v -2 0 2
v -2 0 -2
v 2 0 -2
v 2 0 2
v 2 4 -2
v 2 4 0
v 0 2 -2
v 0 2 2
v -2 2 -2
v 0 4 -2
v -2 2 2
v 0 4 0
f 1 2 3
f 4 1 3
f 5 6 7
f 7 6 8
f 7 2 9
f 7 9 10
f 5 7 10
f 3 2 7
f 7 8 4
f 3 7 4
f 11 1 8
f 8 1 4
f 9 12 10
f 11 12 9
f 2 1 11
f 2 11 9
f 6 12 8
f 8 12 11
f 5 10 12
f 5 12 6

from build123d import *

# Parameters (mm, degrees)
SKETCH1_W           = 4
SKETCH1_H           = 4
BOSS_EXTRUDE1_DEPTH = 4
CUT_EXTRUDE1_DEPTH  = 4
CUT_EXTRUDE2_DEPTH  = 4


with BuildPart() as part:
    # Sketch1 → Boss-Extrude1 (new body)
    with BuildSketch(Plane(origin=(0, 0, 0), x_dir=(1, 0, 0), z_dir=(0, 1, 0))):
        Rectangle(SKETCH1_W, SKETCH1_H)
    extrude(amount=BOSS_EXTRUDE1_DEPTH)

    # Sketch2 → Cut-Extrude1 (cut)
    with BuildSketch(Plane.ZY.offset(2)):
        Polygon((0, 4), (2, 2), (2, 4), align=None)
    extrude(amount=-CUT_EXTRUDE1_DEPTH, mode=Mode.SUBTRACT)

    # Sketch3 → Cut-Extrude2 (cut)
    with BuildSketch(Plane.XY.offset(2)):
        Polygon((-2, 4), (0, 4), (-2, 2), align=None)
        Polygon((2, 4), (0, 2), (2, 2), align=None)
        Polygon((2, 2), (0, 2), (2, 0), align=None)
    extrude(amount=-CUT_EXTRUDE2_DEPTH, mode=Mode.SUBTRACT)


solid = part.part
